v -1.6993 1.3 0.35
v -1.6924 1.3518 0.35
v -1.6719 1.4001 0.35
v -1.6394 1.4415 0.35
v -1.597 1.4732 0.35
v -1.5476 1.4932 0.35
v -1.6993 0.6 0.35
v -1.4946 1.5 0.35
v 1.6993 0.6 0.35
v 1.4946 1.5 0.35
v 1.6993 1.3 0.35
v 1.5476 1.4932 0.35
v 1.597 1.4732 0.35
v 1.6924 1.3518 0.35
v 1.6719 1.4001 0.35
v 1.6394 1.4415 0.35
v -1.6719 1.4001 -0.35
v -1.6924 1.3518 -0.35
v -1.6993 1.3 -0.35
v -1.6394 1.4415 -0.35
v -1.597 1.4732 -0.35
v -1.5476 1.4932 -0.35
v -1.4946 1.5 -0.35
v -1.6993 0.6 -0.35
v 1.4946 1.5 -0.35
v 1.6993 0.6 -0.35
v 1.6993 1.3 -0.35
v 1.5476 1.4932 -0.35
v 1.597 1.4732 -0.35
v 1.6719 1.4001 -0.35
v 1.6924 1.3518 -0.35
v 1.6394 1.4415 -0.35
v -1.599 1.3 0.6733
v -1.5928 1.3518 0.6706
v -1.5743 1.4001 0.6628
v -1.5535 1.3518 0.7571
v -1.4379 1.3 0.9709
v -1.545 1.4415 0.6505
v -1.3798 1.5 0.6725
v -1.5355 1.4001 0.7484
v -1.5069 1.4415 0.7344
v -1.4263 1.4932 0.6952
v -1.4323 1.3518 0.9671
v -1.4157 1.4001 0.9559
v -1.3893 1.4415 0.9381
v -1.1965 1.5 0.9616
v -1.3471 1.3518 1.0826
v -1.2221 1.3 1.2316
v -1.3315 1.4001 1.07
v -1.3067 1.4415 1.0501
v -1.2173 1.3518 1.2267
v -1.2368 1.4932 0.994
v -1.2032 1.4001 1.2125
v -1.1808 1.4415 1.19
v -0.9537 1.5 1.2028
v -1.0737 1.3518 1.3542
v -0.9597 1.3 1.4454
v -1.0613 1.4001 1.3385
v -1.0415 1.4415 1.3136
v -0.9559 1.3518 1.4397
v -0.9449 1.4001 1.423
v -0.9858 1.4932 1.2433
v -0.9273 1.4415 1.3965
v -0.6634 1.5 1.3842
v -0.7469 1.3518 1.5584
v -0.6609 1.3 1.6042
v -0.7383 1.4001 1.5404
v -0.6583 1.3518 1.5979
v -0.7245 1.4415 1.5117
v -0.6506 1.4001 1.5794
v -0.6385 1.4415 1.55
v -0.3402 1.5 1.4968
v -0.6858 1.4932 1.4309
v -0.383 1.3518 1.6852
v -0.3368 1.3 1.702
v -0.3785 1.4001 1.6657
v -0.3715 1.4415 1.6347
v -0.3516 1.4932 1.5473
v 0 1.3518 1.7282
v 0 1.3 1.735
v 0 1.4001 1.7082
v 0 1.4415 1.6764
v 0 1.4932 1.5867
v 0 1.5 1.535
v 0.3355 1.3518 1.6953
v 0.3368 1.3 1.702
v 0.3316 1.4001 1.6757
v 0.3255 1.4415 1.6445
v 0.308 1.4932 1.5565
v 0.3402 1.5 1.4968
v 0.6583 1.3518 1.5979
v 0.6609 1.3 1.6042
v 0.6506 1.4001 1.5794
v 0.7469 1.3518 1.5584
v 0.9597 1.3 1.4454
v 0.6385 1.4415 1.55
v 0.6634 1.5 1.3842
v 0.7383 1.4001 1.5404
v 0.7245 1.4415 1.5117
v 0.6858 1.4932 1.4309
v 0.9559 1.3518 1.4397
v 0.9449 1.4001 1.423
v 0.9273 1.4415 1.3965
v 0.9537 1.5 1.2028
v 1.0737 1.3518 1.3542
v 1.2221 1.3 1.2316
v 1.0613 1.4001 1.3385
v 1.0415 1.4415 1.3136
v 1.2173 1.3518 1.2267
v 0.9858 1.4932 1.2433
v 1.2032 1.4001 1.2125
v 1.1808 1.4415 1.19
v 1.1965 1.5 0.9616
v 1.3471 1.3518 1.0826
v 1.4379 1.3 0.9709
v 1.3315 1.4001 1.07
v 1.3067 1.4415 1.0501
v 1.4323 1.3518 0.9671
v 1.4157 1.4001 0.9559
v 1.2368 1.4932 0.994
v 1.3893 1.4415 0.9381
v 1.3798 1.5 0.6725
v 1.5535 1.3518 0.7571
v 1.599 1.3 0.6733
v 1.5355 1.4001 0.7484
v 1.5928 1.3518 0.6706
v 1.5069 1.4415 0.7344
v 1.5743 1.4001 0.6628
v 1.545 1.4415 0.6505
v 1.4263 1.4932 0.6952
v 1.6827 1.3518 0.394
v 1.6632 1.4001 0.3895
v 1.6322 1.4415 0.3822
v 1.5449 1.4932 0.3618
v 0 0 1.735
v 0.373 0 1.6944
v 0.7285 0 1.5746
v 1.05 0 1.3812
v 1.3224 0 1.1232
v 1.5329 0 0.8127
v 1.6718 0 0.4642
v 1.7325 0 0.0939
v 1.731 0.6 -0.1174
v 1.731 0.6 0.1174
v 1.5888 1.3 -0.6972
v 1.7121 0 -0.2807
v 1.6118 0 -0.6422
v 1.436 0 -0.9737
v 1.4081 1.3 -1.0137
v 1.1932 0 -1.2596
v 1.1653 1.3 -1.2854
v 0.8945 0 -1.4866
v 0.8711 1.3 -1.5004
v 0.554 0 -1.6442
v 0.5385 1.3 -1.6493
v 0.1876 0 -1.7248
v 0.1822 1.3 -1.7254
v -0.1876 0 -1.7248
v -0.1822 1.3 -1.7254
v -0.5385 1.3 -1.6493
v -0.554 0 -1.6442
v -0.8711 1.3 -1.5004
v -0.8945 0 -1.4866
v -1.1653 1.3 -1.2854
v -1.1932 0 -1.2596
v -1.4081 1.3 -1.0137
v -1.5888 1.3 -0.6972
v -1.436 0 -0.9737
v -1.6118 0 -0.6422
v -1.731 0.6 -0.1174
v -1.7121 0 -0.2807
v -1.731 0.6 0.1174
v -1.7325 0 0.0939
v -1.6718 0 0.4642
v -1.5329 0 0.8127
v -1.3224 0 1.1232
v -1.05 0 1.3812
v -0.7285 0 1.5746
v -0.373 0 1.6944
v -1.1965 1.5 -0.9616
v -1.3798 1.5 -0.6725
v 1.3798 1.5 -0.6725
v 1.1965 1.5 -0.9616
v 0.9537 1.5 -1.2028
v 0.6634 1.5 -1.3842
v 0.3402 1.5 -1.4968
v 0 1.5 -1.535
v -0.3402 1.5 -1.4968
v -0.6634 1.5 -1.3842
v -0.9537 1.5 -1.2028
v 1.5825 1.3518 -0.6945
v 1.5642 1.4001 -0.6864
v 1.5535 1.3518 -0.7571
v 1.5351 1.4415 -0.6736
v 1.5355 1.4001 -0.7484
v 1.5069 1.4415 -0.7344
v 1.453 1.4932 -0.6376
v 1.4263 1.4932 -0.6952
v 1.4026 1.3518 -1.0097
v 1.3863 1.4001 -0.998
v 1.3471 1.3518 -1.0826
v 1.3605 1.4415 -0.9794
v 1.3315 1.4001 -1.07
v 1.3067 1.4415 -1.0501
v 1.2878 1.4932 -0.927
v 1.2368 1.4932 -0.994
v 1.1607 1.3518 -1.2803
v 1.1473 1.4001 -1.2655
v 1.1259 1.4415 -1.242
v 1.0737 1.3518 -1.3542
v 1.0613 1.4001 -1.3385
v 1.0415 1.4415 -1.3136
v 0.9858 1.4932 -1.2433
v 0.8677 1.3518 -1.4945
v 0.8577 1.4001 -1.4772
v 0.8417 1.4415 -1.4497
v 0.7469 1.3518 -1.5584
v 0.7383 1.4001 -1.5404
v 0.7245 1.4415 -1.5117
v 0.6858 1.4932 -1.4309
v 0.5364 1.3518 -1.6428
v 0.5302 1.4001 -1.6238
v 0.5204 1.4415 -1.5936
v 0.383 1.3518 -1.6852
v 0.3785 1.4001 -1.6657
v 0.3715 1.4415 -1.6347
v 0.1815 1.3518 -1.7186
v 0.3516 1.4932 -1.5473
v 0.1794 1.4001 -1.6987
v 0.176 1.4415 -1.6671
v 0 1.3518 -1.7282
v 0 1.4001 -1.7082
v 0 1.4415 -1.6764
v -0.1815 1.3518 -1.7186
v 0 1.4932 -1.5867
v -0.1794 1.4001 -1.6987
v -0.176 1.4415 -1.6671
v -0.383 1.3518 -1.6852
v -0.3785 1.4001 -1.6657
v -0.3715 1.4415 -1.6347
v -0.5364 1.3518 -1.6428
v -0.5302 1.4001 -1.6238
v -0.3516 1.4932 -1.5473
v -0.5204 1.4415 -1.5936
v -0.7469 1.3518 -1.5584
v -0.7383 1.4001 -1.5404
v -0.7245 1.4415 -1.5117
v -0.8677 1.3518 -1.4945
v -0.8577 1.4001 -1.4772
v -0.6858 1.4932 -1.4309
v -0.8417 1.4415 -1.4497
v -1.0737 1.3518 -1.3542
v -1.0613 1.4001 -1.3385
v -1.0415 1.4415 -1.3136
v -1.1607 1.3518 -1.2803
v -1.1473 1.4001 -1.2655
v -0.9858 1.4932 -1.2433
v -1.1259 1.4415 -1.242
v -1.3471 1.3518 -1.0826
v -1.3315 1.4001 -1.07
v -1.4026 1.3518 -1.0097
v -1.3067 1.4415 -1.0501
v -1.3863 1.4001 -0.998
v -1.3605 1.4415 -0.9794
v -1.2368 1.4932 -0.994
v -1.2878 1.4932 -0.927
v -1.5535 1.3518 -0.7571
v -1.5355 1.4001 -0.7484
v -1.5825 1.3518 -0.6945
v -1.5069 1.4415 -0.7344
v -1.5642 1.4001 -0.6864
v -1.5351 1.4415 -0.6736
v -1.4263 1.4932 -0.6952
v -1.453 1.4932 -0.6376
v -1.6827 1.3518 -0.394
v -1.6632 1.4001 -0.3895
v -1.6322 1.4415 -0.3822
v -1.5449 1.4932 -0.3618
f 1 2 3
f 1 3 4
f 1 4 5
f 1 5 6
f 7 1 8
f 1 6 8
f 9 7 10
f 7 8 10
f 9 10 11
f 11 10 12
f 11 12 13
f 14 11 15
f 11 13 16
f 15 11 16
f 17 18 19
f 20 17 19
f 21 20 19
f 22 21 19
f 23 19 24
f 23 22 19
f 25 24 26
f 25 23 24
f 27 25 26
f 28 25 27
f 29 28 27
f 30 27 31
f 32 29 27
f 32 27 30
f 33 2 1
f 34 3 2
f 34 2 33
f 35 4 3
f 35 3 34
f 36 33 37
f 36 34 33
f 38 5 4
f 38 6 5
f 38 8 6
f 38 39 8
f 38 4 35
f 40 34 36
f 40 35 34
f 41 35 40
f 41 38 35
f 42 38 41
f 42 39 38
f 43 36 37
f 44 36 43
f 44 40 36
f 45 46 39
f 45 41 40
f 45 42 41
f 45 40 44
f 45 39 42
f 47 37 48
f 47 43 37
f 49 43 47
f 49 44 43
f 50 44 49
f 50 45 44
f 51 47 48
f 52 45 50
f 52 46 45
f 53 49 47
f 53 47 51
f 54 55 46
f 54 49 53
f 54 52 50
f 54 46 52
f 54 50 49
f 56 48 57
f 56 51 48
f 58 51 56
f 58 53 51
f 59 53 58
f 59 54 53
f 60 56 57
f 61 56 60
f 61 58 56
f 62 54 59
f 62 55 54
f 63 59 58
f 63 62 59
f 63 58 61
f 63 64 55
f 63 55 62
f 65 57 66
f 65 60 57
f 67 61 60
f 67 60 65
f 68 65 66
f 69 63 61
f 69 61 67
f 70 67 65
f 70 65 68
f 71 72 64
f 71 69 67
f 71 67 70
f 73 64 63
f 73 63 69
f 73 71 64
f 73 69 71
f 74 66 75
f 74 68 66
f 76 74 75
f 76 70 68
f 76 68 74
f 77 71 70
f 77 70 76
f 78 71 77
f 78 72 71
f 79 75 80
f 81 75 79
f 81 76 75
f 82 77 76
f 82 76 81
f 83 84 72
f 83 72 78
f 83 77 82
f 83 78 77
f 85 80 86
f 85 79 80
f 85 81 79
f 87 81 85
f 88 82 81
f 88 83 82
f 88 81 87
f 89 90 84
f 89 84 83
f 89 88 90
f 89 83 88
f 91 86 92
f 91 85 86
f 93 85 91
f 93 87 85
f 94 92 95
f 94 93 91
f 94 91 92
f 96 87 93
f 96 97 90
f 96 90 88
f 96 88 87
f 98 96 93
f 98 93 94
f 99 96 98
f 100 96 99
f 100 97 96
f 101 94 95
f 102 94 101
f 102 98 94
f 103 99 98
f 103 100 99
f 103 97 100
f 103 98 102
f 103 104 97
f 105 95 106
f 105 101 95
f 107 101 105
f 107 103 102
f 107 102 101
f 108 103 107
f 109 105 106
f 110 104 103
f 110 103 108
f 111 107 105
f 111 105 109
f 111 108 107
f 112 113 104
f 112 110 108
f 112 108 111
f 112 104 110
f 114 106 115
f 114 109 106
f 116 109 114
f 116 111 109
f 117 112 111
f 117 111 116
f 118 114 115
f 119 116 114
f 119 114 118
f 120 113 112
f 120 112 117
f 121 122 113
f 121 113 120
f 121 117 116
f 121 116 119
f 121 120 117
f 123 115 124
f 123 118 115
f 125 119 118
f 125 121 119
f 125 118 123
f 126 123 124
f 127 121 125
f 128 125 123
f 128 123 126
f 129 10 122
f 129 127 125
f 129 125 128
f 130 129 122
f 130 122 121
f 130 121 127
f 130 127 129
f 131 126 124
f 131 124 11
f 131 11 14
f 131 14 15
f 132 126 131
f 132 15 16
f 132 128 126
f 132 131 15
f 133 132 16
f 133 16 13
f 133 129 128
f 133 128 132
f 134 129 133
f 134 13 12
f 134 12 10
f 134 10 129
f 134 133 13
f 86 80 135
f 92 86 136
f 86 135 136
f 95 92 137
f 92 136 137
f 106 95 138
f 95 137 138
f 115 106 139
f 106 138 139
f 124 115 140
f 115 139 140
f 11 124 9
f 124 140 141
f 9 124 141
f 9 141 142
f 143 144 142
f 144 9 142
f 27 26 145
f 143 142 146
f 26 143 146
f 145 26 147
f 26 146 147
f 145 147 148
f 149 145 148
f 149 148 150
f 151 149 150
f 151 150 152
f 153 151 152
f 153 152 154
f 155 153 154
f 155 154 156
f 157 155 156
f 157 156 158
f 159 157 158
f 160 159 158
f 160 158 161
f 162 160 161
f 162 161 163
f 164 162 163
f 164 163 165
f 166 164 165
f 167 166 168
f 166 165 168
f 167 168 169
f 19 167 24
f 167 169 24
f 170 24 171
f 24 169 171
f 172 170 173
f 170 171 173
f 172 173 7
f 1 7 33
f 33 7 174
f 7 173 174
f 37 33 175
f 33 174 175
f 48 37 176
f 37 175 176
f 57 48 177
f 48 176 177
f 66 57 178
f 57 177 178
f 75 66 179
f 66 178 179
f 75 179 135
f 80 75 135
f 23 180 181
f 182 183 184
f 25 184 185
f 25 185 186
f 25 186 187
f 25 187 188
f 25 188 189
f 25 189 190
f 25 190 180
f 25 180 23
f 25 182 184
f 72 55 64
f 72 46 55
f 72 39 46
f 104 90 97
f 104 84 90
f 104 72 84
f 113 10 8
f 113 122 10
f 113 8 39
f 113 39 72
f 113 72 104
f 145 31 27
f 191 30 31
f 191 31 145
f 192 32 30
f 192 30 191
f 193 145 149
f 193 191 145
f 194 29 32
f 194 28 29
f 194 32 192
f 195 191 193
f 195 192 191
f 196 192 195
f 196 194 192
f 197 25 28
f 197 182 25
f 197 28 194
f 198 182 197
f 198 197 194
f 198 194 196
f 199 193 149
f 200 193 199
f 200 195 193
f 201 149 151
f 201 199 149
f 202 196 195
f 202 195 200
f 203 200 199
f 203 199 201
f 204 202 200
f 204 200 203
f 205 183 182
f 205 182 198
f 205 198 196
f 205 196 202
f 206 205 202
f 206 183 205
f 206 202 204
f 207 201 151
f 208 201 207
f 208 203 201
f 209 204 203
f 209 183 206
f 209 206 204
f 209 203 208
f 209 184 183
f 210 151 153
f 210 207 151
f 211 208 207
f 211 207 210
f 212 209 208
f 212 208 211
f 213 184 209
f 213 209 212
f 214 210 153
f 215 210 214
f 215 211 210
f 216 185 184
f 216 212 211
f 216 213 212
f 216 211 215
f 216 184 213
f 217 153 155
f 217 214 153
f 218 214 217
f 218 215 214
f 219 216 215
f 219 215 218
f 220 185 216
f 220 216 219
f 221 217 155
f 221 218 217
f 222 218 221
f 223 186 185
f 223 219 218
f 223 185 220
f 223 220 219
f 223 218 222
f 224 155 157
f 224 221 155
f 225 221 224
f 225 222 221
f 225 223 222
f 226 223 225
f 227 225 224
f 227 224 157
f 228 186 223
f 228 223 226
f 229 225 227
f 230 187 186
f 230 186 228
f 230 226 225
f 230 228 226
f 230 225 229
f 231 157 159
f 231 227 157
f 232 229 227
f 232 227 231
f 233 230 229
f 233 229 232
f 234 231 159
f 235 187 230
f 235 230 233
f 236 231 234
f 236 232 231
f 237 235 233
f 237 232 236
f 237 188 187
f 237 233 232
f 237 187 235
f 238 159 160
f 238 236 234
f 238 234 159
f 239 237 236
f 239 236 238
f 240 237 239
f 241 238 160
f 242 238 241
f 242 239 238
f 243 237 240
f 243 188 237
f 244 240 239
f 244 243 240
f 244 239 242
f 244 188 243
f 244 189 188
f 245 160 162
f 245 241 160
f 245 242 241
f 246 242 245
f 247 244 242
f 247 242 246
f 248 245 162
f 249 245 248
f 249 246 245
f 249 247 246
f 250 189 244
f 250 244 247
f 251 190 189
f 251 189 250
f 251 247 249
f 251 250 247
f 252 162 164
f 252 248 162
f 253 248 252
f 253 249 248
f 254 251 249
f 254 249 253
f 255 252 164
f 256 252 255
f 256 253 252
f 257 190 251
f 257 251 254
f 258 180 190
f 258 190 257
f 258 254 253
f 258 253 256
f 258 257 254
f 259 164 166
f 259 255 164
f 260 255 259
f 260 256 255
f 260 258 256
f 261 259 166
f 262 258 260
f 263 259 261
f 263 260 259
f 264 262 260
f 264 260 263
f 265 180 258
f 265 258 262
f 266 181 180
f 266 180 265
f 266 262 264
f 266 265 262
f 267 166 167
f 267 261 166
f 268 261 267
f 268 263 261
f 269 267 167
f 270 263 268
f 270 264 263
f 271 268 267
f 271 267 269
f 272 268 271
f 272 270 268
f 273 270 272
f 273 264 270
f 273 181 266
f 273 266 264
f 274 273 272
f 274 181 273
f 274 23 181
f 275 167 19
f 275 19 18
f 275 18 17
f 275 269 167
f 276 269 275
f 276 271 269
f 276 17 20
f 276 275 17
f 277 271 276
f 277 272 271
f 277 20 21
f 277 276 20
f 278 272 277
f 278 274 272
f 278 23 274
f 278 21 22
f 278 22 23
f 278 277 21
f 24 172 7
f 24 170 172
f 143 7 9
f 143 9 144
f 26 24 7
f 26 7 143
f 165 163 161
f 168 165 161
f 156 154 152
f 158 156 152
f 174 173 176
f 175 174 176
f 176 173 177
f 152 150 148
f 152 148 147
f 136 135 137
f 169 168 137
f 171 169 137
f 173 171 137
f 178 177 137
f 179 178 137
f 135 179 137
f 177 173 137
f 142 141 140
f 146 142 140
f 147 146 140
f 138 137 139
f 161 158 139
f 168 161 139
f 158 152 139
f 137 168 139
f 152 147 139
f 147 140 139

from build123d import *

# Parameters (mm, degrees)
SKETCH_1_R          = 1.735
EXTRUDE_1_DEPTH     = 1.5
SKETCH_2_W          = 3.5
SKETCH_2_H          = 0.7
CUT_EXTRUDE_1_DEPTH = 0.9
FILLET_2_R          = 0.2


with BuildPart() as part:
    # Эскиз1 → Бобышка-Вытянуть1 (new body)
    with BuildSketch(Plane(origin=(0, 0, 0), x_dir=(1, 0, 0), z_dir=(0, 1, 0))):
        with Locations(Location((0, 0, 0), (0, 0, 270))):
            Circle(SKETCH_1_R)
    extrude(amount=EXTRUDE_1_DEPTH)

    # Эскиз2 → Вырез-Вытянуть1 (cut)
    with BuildSketch(Plane(origin=(0, 1.5, 0), x_dir=(1, 0, 0), z_dir=(0, 1, 0))):
        Rectangle(SKETCH_2_W, SKETCH_2_H)
    extrude(amount=-CUT_EXTRUDE_1_DEPTH, mode=Mode.SUBTRACT)

    # Скругление2
    fillet_2_edges = [part.edges().sort_by_distance(p)[0] for p in [
        (0, 1.5, -1.735),
        (-1.096123852, 1.5, 1.344893118),
    ]]
    fillet(fillet_2_edges, radius=FILLET_2_R)


solid = part.part
